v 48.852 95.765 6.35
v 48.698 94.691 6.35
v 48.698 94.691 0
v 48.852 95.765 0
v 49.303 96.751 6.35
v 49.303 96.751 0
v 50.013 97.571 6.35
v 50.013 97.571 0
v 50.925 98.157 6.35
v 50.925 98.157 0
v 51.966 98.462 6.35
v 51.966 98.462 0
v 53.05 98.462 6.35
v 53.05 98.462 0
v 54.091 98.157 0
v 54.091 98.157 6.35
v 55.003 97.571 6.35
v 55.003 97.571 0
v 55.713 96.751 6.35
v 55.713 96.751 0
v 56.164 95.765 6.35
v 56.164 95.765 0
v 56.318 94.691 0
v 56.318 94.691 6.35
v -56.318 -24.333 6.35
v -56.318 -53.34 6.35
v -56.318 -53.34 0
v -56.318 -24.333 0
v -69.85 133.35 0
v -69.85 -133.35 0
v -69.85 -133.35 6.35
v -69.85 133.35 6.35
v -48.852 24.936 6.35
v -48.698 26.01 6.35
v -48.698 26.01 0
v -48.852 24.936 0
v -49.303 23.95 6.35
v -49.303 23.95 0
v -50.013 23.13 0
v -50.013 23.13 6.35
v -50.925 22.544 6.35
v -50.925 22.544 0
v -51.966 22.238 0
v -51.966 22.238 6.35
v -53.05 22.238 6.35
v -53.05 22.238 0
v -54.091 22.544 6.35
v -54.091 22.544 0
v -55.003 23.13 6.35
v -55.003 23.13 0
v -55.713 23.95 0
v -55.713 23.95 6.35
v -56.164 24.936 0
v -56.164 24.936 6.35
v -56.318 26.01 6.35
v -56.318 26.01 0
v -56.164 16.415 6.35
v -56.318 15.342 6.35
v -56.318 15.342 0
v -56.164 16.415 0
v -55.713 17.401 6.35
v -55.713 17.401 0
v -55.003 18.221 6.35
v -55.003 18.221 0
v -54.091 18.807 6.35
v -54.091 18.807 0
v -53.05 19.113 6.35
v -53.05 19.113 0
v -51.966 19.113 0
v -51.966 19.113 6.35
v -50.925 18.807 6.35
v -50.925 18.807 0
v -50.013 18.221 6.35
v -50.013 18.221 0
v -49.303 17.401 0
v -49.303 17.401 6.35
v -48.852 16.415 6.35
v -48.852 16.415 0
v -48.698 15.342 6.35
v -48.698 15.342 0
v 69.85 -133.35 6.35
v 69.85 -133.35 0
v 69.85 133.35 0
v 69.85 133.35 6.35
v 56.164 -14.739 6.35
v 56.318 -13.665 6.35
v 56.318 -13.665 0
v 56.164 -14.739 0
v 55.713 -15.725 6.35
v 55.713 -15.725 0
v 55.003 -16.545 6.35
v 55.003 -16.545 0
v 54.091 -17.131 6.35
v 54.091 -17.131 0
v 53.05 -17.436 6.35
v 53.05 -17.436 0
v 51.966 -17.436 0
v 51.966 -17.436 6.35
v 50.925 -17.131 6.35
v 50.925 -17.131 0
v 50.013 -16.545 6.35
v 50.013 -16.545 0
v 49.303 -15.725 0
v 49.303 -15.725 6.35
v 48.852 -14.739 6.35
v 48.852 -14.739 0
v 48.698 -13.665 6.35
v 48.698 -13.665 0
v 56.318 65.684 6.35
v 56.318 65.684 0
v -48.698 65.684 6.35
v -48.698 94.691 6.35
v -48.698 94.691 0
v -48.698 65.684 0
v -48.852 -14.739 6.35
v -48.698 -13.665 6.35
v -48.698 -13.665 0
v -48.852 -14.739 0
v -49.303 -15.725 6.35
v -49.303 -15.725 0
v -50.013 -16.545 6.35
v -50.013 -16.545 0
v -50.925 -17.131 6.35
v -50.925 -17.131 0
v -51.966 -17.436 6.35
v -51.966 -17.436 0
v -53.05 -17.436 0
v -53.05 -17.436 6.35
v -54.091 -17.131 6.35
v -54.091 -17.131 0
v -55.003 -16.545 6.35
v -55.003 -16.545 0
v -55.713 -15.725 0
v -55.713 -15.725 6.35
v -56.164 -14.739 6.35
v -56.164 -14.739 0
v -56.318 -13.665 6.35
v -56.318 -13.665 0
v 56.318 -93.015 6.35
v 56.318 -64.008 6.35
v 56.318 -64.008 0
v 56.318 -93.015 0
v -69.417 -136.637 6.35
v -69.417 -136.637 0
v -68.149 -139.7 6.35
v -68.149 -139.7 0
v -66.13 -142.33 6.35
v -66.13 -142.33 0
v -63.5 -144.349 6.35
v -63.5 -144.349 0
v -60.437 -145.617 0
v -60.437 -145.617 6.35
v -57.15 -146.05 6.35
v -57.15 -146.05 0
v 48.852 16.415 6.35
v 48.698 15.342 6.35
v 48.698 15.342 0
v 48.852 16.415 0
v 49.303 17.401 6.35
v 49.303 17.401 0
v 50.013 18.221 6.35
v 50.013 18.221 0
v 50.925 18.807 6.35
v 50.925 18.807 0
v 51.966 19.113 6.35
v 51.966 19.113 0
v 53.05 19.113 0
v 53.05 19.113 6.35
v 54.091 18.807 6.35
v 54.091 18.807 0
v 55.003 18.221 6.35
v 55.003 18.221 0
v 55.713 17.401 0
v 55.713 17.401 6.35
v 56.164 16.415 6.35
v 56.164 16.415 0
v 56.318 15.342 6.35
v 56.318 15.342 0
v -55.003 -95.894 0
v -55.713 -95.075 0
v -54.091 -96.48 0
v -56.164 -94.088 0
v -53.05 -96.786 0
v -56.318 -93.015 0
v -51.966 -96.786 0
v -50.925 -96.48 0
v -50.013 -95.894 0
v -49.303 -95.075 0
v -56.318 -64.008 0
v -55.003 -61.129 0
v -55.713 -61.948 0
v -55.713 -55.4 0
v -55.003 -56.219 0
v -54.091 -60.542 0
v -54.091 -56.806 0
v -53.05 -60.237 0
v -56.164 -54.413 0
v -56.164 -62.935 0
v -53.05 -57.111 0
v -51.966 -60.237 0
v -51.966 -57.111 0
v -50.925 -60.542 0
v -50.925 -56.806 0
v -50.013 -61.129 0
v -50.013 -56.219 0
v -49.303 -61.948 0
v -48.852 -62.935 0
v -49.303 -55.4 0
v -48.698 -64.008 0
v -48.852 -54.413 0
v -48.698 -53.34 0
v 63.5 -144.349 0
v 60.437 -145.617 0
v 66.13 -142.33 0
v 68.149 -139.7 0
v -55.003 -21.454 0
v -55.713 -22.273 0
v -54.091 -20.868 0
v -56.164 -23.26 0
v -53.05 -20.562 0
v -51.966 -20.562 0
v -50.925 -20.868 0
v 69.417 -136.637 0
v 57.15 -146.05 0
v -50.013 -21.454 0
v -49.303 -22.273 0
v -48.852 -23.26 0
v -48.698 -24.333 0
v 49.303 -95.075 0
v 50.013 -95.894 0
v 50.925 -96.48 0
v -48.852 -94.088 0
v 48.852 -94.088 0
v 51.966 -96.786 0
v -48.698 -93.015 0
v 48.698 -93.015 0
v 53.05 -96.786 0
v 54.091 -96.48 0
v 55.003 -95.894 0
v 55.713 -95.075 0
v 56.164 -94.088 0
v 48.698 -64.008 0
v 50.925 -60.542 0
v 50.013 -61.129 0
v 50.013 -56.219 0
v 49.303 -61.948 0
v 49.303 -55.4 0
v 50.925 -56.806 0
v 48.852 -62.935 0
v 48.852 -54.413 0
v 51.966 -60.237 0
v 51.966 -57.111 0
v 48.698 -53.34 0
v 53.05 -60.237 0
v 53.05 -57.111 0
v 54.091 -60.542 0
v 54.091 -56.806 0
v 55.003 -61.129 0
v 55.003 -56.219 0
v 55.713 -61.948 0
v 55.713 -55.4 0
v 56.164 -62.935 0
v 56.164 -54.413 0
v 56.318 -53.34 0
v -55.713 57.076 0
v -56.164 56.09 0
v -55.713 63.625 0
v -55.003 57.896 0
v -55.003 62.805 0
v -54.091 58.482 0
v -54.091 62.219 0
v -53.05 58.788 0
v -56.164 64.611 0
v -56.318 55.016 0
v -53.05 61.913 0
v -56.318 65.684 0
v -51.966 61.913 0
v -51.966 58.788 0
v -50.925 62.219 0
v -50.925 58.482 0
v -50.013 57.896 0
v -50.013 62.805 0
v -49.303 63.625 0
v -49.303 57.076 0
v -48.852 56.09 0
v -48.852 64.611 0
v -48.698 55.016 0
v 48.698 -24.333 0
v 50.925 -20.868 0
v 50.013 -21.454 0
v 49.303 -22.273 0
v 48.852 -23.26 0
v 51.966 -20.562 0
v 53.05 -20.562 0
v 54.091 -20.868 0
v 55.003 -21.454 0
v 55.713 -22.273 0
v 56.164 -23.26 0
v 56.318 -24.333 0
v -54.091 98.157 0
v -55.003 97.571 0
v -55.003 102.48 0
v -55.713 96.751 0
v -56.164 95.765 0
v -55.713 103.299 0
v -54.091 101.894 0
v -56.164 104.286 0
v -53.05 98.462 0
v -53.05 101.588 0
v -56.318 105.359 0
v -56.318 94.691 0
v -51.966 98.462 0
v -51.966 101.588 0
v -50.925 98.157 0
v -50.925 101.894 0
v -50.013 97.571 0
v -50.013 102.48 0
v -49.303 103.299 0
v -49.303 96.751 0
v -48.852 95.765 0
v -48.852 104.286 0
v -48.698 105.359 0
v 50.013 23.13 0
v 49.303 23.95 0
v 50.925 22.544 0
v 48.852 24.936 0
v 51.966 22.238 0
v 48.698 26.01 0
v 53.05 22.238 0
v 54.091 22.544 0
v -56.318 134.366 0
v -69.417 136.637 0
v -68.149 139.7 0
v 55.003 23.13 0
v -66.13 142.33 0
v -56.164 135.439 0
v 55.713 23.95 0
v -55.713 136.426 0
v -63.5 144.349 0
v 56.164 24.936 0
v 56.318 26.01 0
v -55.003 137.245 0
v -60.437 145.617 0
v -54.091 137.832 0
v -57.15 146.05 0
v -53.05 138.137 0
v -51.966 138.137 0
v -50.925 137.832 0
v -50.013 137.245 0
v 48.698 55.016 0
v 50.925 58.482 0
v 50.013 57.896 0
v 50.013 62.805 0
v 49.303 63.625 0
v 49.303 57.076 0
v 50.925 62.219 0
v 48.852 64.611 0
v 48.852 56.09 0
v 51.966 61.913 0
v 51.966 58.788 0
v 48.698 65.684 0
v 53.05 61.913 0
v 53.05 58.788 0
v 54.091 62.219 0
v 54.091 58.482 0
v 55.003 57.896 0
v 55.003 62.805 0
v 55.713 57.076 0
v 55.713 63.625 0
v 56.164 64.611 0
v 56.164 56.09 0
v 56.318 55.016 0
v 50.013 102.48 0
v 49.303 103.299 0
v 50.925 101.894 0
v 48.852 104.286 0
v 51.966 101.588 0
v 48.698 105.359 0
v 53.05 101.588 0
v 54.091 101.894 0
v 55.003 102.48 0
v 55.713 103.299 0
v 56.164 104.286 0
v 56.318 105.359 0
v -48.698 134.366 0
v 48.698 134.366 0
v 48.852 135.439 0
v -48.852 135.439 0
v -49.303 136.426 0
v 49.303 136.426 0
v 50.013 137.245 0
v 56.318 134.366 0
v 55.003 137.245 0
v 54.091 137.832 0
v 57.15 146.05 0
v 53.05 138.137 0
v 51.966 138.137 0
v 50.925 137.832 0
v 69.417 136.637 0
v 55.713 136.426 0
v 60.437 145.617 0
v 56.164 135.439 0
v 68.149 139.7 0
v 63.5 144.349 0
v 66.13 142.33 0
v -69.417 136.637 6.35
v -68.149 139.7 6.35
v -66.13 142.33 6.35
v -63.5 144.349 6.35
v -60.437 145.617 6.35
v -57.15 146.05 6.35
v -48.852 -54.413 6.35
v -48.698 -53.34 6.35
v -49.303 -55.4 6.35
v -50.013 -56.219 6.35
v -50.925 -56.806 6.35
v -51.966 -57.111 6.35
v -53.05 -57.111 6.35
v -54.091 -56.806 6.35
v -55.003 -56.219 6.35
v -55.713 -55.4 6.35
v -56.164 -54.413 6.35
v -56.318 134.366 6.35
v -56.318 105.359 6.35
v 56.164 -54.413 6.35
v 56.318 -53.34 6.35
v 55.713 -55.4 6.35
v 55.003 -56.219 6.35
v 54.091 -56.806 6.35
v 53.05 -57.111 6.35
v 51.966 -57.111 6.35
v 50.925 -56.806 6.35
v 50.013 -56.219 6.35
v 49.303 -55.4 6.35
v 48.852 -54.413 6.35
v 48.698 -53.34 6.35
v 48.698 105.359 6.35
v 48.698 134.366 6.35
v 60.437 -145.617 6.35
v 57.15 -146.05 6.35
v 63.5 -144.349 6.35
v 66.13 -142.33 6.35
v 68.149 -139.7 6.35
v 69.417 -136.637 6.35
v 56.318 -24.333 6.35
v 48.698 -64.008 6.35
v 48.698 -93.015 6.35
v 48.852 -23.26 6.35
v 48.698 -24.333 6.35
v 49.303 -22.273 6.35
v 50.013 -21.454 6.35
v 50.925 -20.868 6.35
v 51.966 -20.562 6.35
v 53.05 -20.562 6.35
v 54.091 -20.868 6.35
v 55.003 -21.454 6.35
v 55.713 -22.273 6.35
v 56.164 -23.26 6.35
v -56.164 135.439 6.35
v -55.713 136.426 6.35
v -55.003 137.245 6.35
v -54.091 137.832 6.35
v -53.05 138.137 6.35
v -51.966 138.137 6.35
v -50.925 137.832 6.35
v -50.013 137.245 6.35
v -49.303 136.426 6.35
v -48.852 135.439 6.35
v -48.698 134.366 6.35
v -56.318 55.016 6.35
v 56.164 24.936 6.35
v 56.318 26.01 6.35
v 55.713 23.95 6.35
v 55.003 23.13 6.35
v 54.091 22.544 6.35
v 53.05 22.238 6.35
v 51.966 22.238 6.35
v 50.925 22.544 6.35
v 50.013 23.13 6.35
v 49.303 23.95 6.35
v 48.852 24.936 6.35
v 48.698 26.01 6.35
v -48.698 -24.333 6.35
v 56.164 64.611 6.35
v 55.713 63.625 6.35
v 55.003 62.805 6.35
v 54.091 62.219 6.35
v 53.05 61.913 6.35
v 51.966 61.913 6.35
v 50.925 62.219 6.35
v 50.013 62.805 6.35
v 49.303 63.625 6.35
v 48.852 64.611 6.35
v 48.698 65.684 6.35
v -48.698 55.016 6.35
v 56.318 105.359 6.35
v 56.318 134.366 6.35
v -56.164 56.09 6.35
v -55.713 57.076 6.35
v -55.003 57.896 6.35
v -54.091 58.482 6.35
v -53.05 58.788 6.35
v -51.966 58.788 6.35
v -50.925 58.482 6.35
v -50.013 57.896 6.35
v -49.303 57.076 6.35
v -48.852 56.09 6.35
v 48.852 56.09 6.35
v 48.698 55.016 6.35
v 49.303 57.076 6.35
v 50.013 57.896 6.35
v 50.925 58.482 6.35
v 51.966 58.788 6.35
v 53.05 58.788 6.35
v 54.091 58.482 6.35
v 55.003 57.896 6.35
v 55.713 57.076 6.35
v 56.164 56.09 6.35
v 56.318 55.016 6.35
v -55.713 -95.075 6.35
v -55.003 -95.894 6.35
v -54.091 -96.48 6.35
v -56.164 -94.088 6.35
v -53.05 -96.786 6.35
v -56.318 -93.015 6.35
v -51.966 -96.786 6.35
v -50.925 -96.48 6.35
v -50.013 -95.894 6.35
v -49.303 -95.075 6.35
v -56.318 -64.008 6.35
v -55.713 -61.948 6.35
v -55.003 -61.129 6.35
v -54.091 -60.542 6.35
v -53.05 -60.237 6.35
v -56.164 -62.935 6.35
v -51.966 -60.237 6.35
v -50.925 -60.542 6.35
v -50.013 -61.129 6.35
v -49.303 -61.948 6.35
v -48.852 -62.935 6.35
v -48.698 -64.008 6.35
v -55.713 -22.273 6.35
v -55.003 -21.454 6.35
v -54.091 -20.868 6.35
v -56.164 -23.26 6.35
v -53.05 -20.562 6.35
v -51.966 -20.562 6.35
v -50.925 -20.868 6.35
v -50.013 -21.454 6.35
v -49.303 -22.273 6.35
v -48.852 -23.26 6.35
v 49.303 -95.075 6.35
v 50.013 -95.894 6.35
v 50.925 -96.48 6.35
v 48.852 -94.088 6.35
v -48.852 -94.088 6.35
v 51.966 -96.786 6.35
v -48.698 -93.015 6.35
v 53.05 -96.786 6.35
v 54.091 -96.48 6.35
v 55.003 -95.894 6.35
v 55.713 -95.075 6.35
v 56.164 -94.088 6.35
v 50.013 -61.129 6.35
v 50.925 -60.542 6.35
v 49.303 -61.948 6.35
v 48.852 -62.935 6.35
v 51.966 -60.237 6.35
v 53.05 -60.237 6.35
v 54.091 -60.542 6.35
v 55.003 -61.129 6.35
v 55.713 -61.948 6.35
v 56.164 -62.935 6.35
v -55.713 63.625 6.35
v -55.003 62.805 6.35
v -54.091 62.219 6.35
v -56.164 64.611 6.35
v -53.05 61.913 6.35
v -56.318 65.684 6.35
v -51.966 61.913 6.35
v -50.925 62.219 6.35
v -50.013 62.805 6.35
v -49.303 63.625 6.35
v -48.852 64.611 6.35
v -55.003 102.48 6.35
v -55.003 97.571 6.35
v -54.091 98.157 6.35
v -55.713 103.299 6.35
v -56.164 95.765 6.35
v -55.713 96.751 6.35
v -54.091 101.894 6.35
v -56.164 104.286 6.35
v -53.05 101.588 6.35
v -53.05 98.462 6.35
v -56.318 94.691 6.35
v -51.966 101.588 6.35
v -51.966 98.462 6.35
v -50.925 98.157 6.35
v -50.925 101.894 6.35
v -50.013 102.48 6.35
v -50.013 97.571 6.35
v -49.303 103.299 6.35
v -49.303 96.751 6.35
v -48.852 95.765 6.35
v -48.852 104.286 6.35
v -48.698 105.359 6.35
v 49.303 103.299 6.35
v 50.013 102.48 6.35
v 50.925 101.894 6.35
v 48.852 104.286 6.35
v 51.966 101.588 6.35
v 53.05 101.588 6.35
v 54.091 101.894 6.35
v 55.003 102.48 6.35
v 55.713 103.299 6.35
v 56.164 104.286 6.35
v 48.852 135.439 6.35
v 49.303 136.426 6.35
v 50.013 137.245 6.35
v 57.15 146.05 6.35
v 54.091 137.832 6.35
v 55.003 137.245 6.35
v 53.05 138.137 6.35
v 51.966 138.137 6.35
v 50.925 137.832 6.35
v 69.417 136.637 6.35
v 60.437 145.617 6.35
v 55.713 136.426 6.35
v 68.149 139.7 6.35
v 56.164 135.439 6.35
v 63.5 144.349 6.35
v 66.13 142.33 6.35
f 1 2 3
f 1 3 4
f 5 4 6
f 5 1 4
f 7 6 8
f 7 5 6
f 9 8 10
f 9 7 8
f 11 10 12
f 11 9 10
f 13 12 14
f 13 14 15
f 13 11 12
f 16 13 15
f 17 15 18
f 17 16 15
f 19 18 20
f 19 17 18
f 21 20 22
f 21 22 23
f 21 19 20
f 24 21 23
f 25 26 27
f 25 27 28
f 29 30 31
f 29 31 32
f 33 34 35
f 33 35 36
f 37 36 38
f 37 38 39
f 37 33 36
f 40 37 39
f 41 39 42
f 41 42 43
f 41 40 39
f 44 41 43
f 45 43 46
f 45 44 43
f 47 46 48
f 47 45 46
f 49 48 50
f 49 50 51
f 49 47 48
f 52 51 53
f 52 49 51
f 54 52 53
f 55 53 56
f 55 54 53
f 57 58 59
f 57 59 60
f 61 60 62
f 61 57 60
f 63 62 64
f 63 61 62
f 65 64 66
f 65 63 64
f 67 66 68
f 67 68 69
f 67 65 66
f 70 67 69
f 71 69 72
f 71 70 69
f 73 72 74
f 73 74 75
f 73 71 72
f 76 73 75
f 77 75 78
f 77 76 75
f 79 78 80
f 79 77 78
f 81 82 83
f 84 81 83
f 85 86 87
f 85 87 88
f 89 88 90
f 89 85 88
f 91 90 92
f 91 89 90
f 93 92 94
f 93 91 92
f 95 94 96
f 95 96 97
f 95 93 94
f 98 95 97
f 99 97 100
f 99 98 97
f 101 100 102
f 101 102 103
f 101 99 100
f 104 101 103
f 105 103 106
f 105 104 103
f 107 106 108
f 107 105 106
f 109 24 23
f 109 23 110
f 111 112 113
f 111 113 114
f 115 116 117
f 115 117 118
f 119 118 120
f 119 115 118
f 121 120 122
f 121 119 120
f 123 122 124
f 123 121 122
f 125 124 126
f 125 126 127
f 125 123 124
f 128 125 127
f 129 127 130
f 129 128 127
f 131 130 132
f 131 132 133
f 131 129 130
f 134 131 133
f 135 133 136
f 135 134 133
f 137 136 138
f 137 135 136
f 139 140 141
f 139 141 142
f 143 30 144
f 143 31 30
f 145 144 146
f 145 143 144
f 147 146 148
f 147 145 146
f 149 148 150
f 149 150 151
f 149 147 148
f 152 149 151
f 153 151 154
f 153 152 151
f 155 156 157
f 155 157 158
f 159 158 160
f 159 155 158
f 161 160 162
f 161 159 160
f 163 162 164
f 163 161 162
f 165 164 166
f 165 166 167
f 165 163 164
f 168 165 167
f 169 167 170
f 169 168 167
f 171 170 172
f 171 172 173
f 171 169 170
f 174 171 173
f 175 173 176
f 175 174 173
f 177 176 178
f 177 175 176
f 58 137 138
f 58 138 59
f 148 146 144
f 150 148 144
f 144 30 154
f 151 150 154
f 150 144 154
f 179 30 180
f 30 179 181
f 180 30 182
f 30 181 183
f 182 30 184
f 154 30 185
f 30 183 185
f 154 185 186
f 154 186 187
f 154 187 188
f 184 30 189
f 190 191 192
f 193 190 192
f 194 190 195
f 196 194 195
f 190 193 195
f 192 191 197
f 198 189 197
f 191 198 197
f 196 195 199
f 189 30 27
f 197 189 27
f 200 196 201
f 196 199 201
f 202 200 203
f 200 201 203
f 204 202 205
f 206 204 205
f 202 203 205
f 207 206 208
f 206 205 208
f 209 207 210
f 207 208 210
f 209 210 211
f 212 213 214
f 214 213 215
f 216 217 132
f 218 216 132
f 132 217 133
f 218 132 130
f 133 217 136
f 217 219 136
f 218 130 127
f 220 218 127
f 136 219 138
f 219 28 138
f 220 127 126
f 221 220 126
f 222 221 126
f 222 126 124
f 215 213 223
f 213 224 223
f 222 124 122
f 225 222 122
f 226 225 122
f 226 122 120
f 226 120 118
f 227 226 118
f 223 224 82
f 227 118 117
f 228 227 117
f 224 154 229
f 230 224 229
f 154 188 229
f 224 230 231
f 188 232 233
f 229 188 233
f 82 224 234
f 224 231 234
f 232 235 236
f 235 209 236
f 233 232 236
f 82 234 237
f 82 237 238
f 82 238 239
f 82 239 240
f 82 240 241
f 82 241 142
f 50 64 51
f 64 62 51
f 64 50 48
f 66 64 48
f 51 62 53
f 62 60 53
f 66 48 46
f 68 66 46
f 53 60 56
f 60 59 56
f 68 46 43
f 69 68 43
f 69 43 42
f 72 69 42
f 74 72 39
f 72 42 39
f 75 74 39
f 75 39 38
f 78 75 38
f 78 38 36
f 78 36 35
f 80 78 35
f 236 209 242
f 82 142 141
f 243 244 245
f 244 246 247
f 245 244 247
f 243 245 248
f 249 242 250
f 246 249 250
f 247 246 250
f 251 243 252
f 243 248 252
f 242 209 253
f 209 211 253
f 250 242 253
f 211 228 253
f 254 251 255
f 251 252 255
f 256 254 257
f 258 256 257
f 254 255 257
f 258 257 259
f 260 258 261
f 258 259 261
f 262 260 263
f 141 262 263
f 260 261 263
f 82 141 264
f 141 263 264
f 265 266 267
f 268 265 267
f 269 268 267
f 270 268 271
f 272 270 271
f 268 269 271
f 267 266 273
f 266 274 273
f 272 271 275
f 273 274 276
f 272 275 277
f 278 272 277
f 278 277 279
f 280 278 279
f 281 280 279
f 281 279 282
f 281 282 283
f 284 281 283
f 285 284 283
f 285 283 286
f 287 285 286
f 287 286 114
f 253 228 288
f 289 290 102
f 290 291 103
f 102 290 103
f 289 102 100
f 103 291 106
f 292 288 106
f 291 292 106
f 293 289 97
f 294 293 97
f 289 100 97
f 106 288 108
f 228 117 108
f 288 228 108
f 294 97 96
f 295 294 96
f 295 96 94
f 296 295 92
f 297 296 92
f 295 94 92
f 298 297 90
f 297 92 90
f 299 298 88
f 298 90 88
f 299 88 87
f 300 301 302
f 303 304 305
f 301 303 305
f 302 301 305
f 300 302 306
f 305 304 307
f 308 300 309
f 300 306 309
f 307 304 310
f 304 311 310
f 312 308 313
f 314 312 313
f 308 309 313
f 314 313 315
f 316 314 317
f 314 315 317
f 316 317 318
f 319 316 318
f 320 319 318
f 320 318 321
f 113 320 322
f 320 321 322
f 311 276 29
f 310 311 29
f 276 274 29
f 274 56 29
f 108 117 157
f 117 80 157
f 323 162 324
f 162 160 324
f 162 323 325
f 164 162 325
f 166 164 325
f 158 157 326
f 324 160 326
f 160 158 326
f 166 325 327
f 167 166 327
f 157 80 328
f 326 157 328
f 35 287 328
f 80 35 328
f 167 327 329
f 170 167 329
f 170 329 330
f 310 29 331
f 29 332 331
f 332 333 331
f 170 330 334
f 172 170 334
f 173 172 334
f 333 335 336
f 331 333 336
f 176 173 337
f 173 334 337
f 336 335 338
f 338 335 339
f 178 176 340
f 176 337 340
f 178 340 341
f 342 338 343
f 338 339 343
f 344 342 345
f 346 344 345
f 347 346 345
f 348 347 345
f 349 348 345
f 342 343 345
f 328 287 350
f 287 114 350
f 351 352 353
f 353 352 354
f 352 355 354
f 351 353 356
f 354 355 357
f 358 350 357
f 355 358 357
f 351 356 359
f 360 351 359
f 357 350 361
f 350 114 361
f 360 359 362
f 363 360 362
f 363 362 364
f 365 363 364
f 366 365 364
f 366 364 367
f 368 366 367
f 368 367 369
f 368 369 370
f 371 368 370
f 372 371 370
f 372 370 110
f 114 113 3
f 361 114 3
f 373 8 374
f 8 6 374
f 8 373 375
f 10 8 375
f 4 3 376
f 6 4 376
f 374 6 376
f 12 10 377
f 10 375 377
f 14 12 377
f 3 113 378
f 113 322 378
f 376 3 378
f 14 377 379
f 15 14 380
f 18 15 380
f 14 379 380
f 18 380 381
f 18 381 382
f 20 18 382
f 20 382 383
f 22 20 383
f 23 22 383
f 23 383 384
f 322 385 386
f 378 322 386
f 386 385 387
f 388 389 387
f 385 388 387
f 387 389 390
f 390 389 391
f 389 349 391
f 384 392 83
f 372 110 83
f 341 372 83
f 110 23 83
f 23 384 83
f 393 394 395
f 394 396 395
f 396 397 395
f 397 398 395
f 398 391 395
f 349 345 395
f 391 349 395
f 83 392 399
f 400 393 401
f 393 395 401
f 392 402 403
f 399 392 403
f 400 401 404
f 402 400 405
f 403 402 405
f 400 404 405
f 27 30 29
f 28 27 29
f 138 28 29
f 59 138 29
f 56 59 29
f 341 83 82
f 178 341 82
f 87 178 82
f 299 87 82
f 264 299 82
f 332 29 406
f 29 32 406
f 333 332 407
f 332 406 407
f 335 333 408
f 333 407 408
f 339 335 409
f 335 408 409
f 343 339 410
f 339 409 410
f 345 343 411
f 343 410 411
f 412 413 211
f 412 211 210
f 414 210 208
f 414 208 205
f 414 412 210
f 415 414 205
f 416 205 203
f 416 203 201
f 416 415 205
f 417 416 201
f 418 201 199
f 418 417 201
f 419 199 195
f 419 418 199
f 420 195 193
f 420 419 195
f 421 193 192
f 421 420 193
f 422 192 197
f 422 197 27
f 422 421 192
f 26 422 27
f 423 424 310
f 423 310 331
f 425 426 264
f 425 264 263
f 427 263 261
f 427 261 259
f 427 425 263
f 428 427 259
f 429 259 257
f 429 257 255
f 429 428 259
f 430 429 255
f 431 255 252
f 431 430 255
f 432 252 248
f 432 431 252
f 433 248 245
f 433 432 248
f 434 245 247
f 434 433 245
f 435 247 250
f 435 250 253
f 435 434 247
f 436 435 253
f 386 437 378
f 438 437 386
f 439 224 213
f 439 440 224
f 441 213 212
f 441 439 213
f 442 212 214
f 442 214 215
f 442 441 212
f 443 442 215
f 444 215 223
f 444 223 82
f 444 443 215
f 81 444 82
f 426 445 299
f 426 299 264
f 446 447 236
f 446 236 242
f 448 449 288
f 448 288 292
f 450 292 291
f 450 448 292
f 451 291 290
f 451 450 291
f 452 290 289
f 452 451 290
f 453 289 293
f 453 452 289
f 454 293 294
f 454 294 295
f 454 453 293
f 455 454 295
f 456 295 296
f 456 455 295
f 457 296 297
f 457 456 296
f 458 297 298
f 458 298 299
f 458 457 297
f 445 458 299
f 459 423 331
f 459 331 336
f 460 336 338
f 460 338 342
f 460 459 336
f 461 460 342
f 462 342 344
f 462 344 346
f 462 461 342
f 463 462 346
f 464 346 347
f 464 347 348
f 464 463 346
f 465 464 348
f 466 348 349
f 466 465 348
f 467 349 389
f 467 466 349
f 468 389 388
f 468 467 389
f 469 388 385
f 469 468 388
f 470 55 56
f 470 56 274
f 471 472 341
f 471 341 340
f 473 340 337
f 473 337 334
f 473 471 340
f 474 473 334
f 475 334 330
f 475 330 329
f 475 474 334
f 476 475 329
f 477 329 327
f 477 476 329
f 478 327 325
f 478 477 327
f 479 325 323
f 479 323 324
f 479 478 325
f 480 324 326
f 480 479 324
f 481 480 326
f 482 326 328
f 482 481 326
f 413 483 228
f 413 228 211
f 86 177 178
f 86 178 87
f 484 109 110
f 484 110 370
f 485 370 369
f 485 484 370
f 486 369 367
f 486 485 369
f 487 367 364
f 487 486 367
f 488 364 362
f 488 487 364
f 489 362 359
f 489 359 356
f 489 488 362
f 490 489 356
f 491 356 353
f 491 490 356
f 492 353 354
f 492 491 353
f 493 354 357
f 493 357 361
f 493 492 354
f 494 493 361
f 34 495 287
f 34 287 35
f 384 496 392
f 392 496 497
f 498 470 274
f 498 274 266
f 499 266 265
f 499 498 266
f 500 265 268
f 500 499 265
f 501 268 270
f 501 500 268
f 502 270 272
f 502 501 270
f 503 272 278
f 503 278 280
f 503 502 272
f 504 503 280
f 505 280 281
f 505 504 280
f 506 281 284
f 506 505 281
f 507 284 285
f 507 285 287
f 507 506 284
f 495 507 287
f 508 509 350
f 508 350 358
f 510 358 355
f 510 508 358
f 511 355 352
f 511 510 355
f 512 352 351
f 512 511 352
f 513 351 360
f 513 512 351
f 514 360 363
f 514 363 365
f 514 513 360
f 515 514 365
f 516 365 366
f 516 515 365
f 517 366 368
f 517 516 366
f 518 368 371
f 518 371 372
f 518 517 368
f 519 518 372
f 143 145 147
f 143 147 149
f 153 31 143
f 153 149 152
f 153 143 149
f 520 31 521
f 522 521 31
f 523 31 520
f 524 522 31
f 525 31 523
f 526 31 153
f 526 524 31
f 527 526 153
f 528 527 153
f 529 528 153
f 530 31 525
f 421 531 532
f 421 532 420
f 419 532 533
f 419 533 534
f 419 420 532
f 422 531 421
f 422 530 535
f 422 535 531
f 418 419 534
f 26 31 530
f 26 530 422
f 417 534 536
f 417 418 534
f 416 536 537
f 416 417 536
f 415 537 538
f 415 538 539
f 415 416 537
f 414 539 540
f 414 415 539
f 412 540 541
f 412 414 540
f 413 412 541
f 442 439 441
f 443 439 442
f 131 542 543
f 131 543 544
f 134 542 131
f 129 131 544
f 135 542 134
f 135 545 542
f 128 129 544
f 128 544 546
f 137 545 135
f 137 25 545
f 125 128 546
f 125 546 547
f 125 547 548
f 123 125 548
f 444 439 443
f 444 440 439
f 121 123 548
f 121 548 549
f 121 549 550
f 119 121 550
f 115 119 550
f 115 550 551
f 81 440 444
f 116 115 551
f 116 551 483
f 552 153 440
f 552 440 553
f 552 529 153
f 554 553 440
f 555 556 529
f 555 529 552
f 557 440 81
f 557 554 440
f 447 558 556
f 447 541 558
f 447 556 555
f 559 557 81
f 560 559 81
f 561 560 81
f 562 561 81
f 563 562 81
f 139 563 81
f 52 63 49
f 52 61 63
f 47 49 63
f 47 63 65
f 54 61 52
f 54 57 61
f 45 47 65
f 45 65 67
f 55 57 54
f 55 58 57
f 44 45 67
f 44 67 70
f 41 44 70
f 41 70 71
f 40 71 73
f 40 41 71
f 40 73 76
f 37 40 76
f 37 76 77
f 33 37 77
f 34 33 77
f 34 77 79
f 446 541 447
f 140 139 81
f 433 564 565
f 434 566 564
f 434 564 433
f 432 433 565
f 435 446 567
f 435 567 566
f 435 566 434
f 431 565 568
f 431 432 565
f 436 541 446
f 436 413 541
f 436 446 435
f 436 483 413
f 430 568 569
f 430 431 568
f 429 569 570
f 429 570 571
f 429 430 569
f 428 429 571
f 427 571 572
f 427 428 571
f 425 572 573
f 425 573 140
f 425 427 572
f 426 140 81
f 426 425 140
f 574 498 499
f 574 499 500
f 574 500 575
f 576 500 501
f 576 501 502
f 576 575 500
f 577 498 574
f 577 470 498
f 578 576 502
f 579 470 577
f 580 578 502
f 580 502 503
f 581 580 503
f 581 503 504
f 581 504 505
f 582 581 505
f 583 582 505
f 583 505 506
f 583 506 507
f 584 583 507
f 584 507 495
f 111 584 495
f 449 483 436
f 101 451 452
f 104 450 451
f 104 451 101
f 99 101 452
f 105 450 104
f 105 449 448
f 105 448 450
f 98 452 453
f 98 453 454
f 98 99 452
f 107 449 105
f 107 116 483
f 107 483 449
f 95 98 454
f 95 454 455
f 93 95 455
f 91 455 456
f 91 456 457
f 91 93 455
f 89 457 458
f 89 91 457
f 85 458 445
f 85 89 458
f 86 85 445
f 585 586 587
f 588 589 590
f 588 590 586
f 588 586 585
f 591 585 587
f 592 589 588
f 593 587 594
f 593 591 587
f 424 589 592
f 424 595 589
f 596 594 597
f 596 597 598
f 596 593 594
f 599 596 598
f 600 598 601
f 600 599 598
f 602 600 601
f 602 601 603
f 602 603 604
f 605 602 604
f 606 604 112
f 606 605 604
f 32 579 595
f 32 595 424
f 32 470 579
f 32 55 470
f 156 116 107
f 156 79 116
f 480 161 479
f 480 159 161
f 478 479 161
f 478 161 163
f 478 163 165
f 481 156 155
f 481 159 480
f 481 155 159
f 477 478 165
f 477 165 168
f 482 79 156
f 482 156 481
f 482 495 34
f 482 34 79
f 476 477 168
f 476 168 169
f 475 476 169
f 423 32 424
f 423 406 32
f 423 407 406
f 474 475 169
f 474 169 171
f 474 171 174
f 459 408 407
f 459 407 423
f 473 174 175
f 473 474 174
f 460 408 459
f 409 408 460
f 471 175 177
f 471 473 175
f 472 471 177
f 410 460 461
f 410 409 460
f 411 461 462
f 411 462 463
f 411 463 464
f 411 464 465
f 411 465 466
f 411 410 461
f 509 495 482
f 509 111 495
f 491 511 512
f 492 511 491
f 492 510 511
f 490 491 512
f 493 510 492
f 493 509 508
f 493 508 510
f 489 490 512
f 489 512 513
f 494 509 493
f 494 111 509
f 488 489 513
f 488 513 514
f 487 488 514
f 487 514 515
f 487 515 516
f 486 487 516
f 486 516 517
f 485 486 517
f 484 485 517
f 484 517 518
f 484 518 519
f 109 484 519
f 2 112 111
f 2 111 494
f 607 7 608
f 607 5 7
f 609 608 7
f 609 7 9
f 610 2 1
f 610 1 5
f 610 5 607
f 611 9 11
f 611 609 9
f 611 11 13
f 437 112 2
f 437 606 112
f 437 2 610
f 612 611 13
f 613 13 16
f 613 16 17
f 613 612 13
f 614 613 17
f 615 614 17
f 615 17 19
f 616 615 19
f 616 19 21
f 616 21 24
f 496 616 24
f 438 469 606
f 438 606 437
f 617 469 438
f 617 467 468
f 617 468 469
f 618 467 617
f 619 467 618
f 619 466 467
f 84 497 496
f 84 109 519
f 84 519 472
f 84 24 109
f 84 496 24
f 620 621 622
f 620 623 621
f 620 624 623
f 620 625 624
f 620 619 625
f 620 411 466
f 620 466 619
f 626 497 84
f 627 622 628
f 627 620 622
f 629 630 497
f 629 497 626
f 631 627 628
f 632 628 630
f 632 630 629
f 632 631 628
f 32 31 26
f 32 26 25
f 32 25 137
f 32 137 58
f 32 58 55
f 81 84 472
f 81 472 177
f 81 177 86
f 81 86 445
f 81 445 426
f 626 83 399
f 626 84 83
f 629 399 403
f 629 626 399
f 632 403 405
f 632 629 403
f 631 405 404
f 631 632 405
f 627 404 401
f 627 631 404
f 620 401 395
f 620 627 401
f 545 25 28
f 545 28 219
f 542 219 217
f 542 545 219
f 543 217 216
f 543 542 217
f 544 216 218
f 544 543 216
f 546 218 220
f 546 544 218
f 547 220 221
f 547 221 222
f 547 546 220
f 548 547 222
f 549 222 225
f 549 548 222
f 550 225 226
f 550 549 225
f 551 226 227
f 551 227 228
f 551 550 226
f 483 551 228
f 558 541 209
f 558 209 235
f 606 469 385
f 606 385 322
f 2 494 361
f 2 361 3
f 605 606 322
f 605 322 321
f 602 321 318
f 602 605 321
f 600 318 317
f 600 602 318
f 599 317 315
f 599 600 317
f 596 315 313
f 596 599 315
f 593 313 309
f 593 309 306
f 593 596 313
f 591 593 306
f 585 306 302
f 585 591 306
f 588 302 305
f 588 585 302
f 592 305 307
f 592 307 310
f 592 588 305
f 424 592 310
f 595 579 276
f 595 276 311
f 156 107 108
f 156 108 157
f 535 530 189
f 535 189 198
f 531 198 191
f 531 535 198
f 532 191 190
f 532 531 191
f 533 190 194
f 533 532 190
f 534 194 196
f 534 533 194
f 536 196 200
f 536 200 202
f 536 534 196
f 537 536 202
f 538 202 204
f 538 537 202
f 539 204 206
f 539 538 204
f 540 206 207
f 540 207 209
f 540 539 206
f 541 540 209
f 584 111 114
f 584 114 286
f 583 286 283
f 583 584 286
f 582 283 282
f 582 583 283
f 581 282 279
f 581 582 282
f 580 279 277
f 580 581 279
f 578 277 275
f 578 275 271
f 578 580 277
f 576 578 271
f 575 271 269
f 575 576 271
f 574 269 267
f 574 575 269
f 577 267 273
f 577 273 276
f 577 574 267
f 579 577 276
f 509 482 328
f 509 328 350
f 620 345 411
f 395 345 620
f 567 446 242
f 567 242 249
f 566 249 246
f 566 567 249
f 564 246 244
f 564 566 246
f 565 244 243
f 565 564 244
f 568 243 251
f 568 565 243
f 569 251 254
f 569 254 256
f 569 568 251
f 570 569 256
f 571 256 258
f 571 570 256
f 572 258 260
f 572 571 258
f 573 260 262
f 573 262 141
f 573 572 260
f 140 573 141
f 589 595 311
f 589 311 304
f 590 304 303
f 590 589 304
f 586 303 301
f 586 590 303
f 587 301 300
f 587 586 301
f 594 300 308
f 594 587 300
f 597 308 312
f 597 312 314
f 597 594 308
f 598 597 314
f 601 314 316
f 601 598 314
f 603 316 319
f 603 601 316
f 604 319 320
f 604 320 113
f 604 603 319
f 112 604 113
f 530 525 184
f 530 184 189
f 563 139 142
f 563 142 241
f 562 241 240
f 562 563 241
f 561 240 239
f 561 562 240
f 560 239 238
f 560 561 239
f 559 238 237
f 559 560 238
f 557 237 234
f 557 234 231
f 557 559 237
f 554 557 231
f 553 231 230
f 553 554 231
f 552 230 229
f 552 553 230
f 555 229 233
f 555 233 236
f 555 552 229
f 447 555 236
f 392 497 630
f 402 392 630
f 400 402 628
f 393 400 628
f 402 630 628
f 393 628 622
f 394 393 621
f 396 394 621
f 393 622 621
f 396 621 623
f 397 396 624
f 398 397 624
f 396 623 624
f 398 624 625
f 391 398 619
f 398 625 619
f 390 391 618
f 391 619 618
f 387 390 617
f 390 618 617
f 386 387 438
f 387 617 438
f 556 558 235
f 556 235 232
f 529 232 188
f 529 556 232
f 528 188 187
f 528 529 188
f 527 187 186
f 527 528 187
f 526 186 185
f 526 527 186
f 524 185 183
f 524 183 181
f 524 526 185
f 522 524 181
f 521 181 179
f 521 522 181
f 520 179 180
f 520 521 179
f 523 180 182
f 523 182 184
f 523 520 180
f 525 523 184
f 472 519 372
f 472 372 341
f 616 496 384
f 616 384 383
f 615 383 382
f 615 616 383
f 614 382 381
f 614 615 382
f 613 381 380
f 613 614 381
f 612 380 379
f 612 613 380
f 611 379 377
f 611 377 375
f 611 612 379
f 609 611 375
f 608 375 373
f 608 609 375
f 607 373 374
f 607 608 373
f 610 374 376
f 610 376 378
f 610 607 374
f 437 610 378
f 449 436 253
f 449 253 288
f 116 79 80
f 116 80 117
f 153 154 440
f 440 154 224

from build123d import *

# Parameters (mm, degrees)
SKETCH1_W           = 139.7
SKETCH1_H           = 292.1
BOSS_EXTRUDE1_DEPTH = 6.35
FILLET1_R           = 12.7
CUT_EXTRUDE1_DEPTH  = 6.35


with BuildPart() as part:
    # Sketch1 → Boss-Extrude1 (new body)
    with BuildSketch(Plane.XY):
        Rectangle(SKETCH1_W, SKETCH1_H)
    extrude(amount=BOSS_EXTRUDE1_DEPTH)

    # Fillet1
    fillet1_edges = [part.edges().sort_by_distance(p)[0] for p in [
        (-69.85, -146.05, 3.175),
        (69.85, -146.05, 3.175),
        (69.85, 146.05, 3.175),
        (-69.85, 146.05, 3.175),
    ]]
    fillet(fillet1_edges, radius=FILLET1_R)

    # Sketch2 → Cut-Extrude1 (cut)
    with BuildSketch(Plane.XY.offset(6.35)):
        with BuildLine():
            Line((48.69815, 134.366), (48.69815, 105.3592))
            ThreePointArc((48.69815, 105.3592), (52.50815, 101.5492), (56.31815, 105.3592))
            Line((56.31815, 105.3592), (56.31815, 134.366))
            ThreePointArc((56.31815, 134.366), (52.50815, 138.176), (48.69815, 134.366))
        make_face()
        with BuildLine():
            Line((-56.31815, 134.366), (-56.31815, 105.3592))
            ThreePointArc((-56.31815, 105.3592), (-52.50815, 101.5492), (-48.69815, 105.3592))
            Line((-48.69815, 105.3592), (-48.69815, 134.366))
            ThreePointArc((-48.69815, 134.366), (-52.50815, 138.176), (-56.31815, 134.366))
        make_face()
        with BuildLine():
            Line((-56.31815, 94.6912), (-56.31815, 65.6844))
            ThreePointArc((-56.31815, 65.6844), (-52.50815, 61.8744), (-48.69815, 65.6844))
            Line((-48.69815, 65.6844), (-48.69815, 94.6912))
            ThreePointArc((-48.69815, 94.6912), (-52.50815, 98.5012), (-56.31815, 94.6912))
        make_face()
        with BuildLine():
            Line((-56.31815, 55.0164), (-56.31815, 26.0096))
            ThreePointArc((-56.31815, 26.0096), (-52.50815, 22.1996), (-48.69815, 26.0096))
            Line((-48.69815, 26.0096), (-48.69815, 55.0164))
            ThreePointArc((-48.69815, 55.0164), (-52.50815, 58.8264), (-56.31815, 55.0164))
        make_face()
        with BuildLine():
            Line((-56.31815, 15.3416), (-56.31815, -13.6652))
            ThreePointArc((-56.31815, -13.6652), (-52.50815, -17.4752), (-48.69815, -13.6652))
            Line((-48.69815, -13.6652), (-48.69815, 15.3416))
            ThreePointArc((-48.69815, 15.3416), (-52.50815, 19.1516), (-56.31815, 15.3416))
        make_face()
        with BuildLine():
            Line((-56.31815, -24.3332), (-56.31815, -53.34))
            ThreePointArc((-56.31815, -53.34), (-52.50815, -57.15), (-48.69815, -53.34))
            Line((-48.69815, -53.34), (-48.69815, -24.3332))
            ThreePointArc((-48.69815, -24.3332), (-52.50815, -20.5232), (-56.31815, -24.3332))
        make_face()
        with BuildLine():
            Line((-56.31815, -64.008), (-56.31815, -93.0148))
            ThreePointArc((-56.31815, -93.0148), (-52.50815, -96.8248), (-48.69815, -93.0148))
            Line((-48.69815, -93.0148), (-48.69815, -64.008))
            ThreePointArc((-48.69815, -64.008), (-52.50815, -60.198), (-56.31815, -64.008))
        make_face()
        with BuildLine():
            Line((48.69815, 94.6912), (48.69815, 65.6844))
            ThreePointArc((48.69815, 65.6844), (52.50815, 61.8744), (56.31815, 65.6844))
            Line((56.31815, 65.6844), (56.31815, 94.6912))
            ThreePointArc((56.31815, 94.6912), (52.50815, 98.5012), (48.69815, 94.6912))
        make_face()
        with BuildLine():
            Line((48.69815, 55.0164), (48.69815, 26.0096))
            ThreePointArc((48.69815, 26.0096), (52.50815, 22.1996), (56.31815, 26.0096))
            Line((56.31815, 26.0096), (56.31815, 55.0164))
            ThreePointArc((56.31815, 55.0164), (52.50815, 58.8264), (48.69815, 55.0164))
        make_face()
        with BuildLine():
            Line((48.69815, 15.3416), (48.69815, -13.6652))
            ThreePointArc((48.69815, -13.6652), (52.50815, -17.4752), (56.31815, -13.6652))
            Line((56.31815, -13.6652), (56.31815, 15.3416))
            ThreePointArc((56.31815, 15.3416), (52.50815, 19.1516), (48.69815, 15.3416))
        make_face()
        with BuildLine():
            Line((48.69815, -24.3332), (48.69815, -53.34))
            ThreePointArc((48.69815, -53.34), (52.50815, -57.15), (56.31815, -53.34))
            Line((56.31815, -53.34), (56.31815, -24.3332))
            ThreePointArc((56.31815, -24.3332), (52.50815, -20.5232), (48.69815, -24.3332))
        make_face()
        with BuildLine():
            Line((48.69815, -64.008), (48.69815, -93.0148))
            ThreePointArc((48.69815, -93.0148), (52.50815, -96.8248), (56.31815, -93.0148))
            Line((56.31815, -93.0148), (56.31815, -64.008))
            ThreePointArc((56.31815, -64.008), (52.50815, -60.198), (48.69815, -64.008))
        make_face()
    extrude(amount=-CUT_EXTRUDE1_DEPTH, mode=Mode.SUBTRACT)


solid = part.part
